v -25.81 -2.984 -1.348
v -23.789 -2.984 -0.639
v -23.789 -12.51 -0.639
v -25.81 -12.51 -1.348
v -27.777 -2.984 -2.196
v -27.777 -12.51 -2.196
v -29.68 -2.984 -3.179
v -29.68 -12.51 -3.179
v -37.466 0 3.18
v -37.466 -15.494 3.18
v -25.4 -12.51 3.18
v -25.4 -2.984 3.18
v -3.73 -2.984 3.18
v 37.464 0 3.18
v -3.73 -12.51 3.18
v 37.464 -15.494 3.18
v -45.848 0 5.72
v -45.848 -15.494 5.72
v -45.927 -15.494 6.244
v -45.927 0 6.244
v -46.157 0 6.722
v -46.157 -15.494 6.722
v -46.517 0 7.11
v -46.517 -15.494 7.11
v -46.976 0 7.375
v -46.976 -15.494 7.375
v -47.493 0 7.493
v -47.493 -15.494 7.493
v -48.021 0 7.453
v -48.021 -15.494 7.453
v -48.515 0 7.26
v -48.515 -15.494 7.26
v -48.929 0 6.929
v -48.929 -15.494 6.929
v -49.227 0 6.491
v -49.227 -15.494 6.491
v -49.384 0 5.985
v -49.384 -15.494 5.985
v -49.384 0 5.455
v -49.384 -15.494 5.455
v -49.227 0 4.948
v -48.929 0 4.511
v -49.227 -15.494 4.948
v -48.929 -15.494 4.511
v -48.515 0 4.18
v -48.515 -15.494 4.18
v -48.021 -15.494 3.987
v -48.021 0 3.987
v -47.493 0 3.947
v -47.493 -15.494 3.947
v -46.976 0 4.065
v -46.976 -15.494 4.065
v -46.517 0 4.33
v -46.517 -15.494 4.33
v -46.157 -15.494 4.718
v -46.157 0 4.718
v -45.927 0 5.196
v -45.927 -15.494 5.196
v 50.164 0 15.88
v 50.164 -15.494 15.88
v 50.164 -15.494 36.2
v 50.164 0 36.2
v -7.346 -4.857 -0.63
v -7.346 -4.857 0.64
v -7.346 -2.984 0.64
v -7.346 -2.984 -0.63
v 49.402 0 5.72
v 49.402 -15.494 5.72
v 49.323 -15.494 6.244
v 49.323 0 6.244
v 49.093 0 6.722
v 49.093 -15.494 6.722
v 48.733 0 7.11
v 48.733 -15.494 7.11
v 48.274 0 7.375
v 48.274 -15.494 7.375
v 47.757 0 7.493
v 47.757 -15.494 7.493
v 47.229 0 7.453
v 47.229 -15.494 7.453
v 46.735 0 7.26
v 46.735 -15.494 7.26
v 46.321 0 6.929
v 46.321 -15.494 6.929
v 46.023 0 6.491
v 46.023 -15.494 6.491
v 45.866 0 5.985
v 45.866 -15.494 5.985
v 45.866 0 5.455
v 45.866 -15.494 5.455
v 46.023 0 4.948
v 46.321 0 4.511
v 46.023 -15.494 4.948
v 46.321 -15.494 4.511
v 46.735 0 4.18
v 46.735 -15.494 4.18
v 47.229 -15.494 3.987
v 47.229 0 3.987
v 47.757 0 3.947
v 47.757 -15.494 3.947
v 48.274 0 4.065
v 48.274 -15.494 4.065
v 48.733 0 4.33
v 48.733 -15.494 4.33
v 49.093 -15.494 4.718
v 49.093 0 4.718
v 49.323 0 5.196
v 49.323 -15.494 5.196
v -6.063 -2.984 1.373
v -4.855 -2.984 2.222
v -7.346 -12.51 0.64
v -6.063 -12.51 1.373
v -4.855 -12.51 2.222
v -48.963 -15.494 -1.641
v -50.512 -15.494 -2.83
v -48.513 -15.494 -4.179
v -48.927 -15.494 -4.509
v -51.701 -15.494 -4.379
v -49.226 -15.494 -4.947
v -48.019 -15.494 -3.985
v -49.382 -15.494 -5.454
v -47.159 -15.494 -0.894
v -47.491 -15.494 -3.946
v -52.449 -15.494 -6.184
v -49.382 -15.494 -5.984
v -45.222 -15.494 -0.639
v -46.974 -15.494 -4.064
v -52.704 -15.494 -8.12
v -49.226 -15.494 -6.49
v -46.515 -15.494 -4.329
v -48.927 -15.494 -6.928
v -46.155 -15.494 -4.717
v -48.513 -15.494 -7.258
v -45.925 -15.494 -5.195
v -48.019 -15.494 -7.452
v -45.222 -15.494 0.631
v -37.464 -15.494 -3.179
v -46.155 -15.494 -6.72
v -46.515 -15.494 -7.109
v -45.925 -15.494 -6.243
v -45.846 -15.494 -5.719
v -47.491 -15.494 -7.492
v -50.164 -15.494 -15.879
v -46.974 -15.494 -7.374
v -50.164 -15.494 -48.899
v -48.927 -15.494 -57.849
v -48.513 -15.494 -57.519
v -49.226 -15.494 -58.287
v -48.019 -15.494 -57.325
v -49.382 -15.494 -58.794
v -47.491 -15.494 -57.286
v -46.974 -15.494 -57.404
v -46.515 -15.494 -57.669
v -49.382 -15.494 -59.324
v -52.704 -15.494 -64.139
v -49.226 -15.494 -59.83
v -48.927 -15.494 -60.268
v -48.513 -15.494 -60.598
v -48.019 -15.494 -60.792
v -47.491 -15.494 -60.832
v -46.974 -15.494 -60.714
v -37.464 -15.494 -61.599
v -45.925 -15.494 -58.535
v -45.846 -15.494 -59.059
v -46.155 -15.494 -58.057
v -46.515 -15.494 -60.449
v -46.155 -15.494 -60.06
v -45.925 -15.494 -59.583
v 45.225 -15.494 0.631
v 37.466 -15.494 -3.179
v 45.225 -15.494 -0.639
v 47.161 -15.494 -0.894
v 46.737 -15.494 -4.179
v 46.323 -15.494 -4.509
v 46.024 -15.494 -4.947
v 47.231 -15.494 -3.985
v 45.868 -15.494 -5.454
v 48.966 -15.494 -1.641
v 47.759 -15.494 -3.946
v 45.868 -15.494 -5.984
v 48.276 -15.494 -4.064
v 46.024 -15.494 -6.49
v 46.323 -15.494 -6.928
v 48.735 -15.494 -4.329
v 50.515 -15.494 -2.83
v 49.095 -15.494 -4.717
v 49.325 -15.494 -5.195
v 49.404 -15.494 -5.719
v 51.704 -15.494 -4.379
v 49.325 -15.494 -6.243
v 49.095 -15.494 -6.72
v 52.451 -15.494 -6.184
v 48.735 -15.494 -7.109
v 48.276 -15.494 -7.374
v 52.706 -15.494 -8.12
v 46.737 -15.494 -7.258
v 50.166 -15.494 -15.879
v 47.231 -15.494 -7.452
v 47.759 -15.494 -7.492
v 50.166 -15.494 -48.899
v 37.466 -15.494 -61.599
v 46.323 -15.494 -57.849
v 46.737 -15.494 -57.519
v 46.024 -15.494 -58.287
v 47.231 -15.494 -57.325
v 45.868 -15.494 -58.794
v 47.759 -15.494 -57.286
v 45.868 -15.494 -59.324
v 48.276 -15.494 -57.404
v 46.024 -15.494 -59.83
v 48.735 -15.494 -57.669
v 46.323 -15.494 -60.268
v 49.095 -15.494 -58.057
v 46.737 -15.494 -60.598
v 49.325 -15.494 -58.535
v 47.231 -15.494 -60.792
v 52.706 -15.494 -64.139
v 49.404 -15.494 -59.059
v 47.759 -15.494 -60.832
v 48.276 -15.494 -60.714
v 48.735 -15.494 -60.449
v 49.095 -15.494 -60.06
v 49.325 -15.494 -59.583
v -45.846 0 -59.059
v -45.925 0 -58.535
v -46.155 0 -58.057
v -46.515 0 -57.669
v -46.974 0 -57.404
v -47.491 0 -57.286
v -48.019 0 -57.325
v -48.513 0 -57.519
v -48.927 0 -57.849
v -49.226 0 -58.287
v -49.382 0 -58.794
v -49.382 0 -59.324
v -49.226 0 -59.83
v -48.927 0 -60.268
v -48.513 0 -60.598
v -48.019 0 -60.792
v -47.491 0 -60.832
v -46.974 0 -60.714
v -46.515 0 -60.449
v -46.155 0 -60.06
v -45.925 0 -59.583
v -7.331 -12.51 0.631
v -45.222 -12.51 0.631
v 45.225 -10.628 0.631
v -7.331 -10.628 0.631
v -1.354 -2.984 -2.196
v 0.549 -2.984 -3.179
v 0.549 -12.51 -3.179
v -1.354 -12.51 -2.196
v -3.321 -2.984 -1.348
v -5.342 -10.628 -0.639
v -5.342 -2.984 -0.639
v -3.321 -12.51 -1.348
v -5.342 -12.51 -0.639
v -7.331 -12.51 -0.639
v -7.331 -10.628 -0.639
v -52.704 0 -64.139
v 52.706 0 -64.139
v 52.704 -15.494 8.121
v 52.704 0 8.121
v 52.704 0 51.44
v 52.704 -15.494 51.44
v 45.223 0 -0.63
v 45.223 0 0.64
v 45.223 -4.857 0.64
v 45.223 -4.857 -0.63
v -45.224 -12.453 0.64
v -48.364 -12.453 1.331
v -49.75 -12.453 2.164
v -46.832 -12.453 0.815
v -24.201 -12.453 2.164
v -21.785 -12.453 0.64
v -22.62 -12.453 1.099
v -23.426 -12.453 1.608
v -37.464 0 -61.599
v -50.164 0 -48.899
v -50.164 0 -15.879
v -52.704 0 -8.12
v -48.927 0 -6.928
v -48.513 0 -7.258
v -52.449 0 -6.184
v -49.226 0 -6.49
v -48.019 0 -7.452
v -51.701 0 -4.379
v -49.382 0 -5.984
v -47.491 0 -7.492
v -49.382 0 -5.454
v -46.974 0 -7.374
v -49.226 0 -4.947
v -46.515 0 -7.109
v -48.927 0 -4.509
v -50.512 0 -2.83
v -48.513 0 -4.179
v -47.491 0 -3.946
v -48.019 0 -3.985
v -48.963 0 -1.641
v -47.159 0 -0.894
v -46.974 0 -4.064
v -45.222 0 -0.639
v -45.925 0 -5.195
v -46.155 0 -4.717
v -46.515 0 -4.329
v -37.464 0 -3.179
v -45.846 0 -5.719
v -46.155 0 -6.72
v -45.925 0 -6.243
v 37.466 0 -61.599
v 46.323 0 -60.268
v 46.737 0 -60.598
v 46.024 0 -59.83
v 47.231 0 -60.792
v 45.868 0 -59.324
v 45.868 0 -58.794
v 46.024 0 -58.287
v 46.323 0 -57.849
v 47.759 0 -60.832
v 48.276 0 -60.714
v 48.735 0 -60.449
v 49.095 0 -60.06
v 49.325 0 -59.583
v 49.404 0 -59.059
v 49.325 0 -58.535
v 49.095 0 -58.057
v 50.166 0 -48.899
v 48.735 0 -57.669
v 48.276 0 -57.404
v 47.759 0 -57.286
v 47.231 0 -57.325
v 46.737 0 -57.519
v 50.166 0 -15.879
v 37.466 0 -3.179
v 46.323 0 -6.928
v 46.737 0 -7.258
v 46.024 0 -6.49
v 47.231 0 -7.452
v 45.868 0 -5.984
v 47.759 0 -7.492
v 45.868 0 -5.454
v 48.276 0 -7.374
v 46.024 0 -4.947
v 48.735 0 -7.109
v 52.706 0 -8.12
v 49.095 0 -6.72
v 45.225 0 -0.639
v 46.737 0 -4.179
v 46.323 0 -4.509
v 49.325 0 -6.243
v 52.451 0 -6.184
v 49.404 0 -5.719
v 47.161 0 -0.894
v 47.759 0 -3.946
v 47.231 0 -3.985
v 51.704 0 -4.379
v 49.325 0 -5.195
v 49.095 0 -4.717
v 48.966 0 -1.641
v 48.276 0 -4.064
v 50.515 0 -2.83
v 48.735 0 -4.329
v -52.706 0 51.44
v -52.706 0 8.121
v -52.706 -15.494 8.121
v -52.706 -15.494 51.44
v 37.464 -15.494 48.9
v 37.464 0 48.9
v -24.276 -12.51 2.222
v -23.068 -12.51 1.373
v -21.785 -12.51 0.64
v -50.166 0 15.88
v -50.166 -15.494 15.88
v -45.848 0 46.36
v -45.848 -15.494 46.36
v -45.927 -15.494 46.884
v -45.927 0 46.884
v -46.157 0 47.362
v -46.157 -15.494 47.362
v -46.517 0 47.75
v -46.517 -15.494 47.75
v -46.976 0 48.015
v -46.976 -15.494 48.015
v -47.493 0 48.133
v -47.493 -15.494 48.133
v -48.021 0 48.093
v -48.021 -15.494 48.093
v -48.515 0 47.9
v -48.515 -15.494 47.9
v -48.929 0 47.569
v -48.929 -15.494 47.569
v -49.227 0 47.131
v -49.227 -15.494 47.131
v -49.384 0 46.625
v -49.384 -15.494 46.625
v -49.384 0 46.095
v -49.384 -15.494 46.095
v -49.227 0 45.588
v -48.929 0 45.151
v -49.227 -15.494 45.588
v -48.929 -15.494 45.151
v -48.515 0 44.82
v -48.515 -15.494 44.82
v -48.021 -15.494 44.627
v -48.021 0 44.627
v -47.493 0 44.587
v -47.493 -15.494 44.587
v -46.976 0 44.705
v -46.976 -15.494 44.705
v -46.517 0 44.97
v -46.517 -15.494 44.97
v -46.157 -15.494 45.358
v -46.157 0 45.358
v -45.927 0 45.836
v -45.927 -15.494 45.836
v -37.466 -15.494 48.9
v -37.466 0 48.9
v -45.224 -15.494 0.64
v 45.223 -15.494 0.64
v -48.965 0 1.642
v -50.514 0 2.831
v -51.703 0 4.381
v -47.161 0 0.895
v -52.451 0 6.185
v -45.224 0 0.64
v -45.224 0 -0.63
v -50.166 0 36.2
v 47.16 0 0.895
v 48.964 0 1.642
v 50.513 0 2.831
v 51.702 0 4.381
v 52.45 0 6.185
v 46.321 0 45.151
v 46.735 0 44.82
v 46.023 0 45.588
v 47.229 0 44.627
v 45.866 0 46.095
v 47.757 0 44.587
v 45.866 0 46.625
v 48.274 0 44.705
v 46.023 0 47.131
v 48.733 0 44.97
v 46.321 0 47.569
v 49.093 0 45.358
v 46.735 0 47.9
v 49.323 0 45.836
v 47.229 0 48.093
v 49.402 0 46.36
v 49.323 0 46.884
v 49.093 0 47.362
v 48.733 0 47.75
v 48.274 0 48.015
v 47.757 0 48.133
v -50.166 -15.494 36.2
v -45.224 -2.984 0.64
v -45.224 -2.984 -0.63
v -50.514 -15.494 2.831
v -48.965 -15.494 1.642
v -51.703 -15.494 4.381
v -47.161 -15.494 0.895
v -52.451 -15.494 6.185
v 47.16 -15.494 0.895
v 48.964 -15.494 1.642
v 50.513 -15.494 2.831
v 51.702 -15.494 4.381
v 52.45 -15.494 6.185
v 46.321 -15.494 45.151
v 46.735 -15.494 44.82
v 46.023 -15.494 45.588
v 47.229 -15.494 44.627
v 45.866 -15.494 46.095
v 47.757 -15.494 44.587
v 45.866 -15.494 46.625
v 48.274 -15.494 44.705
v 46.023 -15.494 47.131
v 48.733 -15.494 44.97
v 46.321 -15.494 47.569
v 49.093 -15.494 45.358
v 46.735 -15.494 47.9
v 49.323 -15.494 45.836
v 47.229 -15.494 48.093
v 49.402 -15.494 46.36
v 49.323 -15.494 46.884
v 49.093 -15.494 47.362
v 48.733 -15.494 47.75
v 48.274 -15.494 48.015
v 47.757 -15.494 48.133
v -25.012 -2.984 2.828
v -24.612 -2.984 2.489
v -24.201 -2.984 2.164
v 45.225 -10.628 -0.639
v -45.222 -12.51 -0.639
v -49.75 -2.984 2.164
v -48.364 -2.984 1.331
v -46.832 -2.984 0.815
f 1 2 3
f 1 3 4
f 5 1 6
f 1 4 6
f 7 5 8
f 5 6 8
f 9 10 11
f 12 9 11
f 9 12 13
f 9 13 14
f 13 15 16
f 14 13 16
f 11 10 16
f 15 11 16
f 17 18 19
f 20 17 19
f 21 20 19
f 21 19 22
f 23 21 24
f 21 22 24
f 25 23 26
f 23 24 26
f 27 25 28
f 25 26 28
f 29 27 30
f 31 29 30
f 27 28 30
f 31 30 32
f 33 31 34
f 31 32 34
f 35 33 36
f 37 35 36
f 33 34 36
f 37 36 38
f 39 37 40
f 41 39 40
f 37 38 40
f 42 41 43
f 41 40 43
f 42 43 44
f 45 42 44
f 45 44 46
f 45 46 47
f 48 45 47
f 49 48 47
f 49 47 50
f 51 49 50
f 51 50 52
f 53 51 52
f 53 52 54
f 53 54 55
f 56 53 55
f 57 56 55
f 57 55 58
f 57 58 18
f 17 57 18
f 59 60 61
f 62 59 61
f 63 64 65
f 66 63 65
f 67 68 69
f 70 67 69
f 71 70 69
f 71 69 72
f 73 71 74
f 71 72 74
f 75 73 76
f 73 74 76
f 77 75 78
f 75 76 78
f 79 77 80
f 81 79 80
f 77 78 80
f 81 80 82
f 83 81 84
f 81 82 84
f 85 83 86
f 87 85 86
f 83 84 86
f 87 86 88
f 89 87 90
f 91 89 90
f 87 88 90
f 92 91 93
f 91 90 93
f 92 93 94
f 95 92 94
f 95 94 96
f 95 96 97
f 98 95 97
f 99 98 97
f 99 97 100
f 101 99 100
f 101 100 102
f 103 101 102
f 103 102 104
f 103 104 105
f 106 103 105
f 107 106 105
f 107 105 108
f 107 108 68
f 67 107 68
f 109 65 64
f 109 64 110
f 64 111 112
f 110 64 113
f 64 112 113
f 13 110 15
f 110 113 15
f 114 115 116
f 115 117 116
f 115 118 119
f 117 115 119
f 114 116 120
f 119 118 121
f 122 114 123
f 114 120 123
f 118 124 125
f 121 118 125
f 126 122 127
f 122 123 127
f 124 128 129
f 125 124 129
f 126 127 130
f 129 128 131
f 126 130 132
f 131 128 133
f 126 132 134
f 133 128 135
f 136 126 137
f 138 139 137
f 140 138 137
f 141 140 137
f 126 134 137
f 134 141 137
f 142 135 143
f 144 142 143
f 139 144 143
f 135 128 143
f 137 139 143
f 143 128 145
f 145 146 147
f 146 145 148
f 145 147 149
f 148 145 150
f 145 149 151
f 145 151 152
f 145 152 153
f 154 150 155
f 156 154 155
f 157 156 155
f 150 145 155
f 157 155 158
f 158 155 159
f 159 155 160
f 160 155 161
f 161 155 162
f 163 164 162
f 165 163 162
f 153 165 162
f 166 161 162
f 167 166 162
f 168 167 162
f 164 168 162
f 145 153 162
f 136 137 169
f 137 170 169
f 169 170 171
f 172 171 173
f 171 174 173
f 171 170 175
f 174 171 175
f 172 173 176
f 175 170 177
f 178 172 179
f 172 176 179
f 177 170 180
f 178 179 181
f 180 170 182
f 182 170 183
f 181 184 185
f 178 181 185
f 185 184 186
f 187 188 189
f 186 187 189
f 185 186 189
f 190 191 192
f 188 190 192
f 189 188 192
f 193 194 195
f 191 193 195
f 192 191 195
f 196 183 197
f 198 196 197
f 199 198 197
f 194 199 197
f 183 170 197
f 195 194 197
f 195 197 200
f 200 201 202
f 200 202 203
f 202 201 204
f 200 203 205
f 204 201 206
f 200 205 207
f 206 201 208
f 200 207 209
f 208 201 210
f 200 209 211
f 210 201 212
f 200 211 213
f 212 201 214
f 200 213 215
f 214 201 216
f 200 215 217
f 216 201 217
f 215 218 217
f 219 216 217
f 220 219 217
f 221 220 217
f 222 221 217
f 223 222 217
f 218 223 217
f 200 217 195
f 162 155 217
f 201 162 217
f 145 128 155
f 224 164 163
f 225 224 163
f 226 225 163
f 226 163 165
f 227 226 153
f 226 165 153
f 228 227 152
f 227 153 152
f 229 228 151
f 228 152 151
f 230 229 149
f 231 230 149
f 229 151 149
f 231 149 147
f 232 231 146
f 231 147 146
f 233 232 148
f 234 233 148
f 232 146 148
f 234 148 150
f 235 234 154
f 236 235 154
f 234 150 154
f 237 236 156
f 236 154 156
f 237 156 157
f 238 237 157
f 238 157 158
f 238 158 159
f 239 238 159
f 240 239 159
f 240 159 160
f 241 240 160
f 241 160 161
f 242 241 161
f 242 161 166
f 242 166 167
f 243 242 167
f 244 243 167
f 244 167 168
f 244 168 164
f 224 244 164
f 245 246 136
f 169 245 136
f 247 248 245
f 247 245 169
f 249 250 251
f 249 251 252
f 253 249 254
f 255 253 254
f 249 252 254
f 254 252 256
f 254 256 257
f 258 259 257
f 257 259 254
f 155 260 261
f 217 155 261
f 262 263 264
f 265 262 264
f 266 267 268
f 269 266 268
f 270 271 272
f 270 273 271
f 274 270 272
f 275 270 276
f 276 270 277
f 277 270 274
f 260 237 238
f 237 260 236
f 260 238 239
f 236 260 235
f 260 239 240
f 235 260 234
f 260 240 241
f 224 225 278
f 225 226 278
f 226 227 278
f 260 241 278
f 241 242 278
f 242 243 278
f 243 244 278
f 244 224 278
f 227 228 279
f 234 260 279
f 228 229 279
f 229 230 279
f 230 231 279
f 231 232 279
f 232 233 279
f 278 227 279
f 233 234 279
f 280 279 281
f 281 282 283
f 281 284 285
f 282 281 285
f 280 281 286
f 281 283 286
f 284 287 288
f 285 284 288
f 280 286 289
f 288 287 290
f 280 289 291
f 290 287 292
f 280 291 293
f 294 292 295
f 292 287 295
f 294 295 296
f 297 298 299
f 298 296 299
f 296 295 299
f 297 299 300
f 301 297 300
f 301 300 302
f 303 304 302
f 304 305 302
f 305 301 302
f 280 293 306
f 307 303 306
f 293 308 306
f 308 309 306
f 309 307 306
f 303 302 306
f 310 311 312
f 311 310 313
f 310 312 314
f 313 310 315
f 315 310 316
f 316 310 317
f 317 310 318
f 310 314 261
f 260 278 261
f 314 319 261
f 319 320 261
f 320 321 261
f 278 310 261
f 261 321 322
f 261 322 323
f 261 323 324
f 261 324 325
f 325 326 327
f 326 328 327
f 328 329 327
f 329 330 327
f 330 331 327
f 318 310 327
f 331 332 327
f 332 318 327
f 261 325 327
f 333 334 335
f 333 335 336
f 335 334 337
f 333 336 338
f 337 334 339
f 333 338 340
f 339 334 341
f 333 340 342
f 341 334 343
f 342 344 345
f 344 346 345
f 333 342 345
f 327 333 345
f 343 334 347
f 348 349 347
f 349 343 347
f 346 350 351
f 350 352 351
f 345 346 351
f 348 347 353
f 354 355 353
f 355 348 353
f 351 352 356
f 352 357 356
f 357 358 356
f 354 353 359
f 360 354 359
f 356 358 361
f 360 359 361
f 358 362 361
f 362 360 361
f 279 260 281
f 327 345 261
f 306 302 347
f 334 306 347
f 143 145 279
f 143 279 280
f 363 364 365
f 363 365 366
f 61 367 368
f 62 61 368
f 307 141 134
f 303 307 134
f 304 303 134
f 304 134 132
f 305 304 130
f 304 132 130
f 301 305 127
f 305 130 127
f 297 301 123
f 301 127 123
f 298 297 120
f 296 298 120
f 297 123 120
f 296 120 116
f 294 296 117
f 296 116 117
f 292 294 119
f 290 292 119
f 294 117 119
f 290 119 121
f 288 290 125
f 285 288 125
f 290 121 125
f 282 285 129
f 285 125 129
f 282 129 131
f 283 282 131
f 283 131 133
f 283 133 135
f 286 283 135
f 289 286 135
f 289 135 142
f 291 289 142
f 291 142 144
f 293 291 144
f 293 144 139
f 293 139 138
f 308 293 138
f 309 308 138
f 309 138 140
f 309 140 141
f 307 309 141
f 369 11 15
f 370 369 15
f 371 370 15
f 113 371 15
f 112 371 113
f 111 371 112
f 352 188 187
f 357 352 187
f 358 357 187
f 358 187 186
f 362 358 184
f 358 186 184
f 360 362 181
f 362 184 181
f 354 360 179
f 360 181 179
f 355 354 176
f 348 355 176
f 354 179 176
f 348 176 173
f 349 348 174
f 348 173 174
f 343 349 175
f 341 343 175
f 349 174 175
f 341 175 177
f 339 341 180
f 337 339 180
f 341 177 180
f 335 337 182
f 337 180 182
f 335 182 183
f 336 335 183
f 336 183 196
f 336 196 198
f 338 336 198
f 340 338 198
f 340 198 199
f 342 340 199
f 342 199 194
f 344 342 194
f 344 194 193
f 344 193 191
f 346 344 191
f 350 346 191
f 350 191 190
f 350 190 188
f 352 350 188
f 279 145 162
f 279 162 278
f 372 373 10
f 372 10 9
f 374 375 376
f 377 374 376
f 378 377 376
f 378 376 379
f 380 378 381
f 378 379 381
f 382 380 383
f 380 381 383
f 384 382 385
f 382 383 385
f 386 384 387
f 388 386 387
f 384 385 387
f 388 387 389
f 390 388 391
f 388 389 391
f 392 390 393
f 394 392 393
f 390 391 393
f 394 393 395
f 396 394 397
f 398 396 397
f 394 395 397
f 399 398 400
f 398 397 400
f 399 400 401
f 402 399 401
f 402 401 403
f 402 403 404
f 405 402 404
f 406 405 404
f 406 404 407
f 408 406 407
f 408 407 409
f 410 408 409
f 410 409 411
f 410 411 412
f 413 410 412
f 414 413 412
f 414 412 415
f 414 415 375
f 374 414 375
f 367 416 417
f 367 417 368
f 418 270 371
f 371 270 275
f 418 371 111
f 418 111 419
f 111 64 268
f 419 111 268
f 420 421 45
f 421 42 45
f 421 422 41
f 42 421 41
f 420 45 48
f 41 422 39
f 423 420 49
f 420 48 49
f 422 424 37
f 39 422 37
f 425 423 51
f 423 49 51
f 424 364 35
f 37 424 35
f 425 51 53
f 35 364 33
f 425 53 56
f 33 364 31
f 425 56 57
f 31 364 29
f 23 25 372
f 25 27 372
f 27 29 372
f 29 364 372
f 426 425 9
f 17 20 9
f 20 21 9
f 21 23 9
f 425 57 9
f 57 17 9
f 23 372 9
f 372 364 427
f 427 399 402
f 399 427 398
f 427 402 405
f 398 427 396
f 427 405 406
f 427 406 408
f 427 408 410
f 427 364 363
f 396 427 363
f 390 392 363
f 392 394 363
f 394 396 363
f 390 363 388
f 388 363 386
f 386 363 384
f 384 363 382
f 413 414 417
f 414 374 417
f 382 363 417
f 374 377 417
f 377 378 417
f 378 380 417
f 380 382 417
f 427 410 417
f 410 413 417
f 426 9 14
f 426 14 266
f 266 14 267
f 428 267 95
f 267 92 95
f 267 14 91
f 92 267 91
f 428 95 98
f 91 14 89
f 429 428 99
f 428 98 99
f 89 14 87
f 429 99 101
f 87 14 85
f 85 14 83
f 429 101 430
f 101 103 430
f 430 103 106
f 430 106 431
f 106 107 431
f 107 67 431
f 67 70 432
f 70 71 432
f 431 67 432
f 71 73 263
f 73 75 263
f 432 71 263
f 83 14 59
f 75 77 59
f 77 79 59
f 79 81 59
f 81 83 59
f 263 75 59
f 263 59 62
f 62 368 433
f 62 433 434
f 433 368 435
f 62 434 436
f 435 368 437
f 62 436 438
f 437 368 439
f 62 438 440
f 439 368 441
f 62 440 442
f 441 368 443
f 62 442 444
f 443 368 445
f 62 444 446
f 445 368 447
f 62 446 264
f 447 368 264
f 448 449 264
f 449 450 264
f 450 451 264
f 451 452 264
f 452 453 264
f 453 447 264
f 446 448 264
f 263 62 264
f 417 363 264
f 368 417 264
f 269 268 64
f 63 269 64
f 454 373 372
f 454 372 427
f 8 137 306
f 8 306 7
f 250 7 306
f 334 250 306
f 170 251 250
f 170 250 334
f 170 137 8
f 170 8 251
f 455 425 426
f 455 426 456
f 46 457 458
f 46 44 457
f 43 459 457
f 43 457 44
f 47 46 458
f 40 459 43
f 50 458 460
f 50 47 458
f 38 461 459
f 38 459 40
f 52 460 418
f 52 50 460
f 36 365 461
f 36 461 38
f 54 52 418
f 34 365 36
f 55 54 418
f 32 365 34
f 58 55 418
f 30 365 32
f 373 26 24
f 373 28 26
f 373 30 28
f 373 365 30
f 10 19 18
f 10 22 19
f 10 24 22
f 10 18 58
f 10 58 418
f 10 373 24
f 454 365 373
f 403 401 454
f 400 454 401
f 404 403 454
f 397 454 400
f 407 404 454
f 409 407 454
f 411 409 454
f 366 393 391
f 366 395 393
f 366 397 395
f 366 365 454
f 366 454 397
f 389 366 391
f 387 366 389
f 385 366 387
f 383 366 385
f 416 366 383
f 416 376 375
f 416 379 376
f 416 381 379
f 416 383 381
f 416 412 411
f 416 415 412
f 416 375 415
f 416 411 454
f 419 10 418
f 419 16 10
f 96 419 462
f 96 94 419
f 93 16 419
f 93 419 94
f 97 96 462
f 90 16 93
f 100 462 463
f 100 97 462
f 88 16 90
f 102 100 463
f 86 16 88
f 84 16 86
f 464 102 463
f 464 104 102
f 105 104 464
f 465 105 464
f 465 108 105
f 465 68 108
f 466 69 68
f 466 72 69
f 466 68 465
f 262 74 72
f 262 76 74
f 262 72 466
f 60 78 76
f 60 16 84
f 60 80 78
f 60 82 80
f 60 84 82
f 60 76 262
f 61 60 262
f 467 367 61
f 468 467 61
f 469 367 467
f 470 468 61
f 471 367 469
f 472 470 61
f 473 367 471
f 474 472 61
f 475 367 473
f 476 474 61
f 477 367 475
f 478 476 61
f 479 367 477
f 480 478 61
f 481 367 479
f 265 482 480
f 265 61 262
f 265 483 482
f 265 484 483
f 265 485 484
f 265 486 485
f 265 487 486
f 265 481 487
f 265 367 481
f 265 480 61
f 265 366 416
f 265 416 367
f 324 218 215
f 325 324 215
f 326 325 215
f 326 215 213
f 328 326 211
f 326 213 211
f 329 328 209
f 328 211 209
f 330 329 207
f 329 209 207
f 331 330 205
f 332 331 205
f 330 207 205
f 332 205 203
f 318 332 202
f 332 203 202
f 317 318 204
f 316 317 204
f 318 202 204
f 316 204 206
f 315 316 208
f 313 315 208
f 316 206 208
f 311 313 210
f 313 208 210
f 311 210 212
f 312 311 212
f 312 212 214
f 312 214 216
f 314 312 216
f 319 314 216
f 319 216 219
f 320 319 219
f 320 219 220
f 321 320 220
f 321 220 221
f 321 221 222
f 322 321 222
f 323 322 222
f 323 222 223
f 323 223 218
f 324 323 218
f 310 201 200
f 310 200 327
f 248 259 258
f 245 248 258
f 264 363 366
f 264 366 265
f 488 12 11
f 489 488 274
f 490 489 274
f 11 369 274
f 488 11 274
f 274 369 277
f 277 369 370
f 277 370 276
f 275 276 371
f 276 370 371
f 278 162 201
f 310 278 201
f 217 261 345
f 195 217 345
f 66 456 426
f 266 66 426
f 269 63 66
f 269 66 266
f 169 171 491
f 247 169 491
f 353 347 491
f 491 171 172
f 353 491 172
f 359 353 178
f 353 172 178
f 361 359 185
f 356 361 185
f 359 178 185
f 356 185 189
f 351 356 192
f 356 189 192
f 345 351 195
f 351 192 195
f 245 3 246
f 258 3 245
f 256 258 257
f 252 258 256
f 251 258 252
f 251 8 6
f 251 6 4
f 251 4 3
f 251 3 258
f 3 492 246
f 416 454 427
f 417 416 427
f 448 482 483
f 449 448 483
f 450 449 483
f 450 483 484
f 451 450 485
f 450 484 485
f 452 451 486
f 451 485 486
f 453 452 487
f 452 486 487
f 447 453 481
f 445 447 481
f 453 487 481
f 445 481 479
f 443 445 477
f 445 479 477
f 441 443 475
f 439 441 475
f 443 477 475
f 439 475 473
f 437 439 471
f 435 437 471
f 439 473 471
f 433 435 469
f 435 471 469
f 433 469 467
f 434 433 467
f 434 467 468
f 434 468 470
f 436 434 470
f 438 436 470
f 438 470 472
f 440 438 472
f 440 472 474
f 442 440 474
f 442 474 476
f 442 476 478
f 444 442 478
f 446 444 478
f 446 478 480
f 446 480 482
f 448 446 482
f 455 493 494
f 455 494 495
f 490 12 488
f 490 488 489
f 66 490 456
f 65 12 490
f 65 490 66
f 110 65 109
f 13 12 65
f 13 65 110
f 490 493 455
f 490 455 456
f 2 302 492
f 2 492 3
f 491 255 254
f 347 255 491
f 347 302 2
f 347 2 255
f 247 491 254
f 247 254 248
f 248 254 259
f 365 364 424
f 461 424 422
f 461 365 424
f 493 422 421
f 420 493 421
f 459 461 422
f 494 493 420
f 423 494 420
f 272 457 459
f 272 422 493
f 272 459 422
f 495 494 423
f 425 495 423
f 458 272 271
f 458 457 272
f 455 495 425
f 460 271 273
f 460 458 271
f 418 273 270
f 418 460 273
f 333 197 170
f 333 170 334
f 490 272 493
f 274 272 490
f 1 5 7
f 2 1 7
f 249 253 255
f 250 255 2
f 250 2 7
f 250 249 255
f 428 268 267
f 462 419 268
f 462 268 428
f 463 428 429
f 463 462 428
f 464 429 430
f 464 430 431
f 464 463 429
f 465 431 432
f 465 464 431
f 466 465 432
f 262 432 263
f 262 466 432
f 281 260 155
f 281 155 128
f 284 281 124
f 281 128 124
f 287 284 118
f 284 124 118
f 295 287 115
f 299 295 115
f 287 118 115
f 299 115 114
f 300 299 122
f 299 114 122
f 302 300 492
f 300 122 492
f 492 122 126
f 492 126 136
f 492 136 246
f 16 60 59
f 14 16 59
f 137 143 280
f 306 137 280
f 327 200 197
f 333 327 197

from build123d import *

# Parameters (mm, degrees)
F0_W      = 105.41
F0_H      = 50.8
F2_DEPTH  = 15.494
F1_W      = 105.41
F1_H      = 63.5
F3_DEPTH  = 15.494
F4_W      = 100.33
F4_H      = 45.72
F6_DEPTH  = 25.4
F5_W      = 100.33
F5_H      = 58.42
F7_DEPTH  = 25.4
F8_SIZE   = 12.7
F9_SIZE   = 12.7
F10_R     = 1.778
F12_DEPTH = 25.4
F11_R     = 1.778
F13_DEPTH = 25.4
F16_DEPTH = 4.7625
F17_R     = 7.4811649871
F17_2_R   = 7.4811649871
F18_W     = 37.8915182585
F18_H     = 2.9845
F19_DEPTH = 1.27
F20_W     = 37.8787715588
F20_H     = 2.9845
F21_DEPTH = 1.27
F22_W     = 33.4627879753
F22_H     = 9.4689852803
F23_DEPTH = 1.524


with BuildPart() as f2:
    # F0 (on Front) → F2 (new body)
    with BuildSketch(Plane.XZ):
        with Locations((-0.0005561543, 26.0399340928)):
            Rectangle(F0_W, F0_H)
    extrude(amount=F2_DEPTH)

    # F4 (on face) → F6 (cut)
    with BuildSketch(Plane.XZ.offset(15.494)):
        with Locations((-0.0005561543, 26.0399340928)):
            Rectangle(F4_W, F4_H)
    extrude(amount=-F6_DEPTH, mode=Mode.SUBTRACT)

    # F8
    f8_edges = [f2.edges().sort_by_distance(p)[0] for p in [
        (-50.165556, -7.747, 48.899934),
        (-50.165556, -7.747, 3.179934),
        (50.164444, -7.747, 48.899934),
        (50.164444, -7.747, 3.179934),
    ]]
    chamfer(f8_edges, length=F8_SIZE)

    # F10 (on face) → F12 (cut)
    with BuildSketch(Plane.XZ.offset(15.494)):
        with Locations((-47.6255561543, 46.3599340928)):
            Circle(F10_R)
        with Locations((47.6244438457, 46.3599340928)):
            Circle(F10_R)
        with Locations((47.6244438457, 5.7199340928)):
            Circle(F10_R)
        with Locations((-47.6255561543, 5.7199340928)):
            Circle(F10_R)
    extrude(amount=-F12_DEPTH, mode=Mode.SUBTRACT)


with BuildPart() as f3:
    # F1 (on Front) → F3 (new body)
    with BuildSketch(Plane.XZ):
        with Locations((0.0013719928, -32.3886321804)):
            Rectangle(F1_W, F1_H)
    extrude(amount=F3_DEPTH)

    # F5 (on face) → F7 (cut)
    with BuildSketch(Plane.XZ.offset(15.494)):
        with Locations((0.0013719928, -32.3886321804)):
            Rectangle(F5_W, F5_H)
    extrude(amount=-F7_DEPTH, mode=Mode.SUBTRACT)

    # F9
    f9_edges = [f3.edges().sort_by_distance(p)[0] for p in [
        (-50.163628, -7.747, -3.178632),
        (50.166372, -7.747, -3.178632),
        (-50.163628, -7.747, -61.598632),
        (50.166372, -7.747, -61.598632),
    ]]
    chamfer(f9_edges, length=F9_SIZE)

    # F11 (on face) → F13 (cut)
    with BuildSketch(Plane.XZ.offset(15.494)):
        with Locations((-47.6236280072, -5.7186321804)):
            Circle(F11_R)
        with Locations((47.6263719928, -5.7186321804)):
            Circle(F11_R)
        with Locations((47.6263719928, -59.0586321804)):
            Circle(F11_R)
        with Locations((-47.6236280072, -59.0586321804)):
            Circle(F11_R)
    extrude(amount=-F13_DEPTH, mode=Mode.SUBTRACT)


with BuildPart() as f16_tool:
    # F15 (on offset) → F16 (new body, symmetric)
    with BuildSketch(Plane.XZ.offset(7.747)):
        with BuildLine():
            ThreePointArc((-20.7305265373, 0.1485658363), (-34.1169625247, -54.0672234968), (16.3385446548, -30.1341861486))
            ThreePointArc((16.3385446548, -30.1341861486), (9.3676365689, -10.5826244032), (-8.4002750212, 0.1485658363))
            ThreePointArc((-8.4002750212, 0.1485658363), (-14.5654007792, -1.0989419614), (-20.7305265373, 0.1485658363))
        make_face()
        with BuildLine():
            ThreePointArc((-20.7305265373, 0.1485658363), (-14.5654007792, -1.0989419614), (-8.4002750212, 0.1485658363))
            ThreePointArc((-8.4002750212, 0.1485658363), (-14.5654007792, 0.7697592854), (-20.7305265373, 0.1485658363))
        make_face()
        with BuildLine():
            ThreePointArc((-20.7305265373, 0.1485658363), (-14.5654007792, 0.7697592854), (-8.4002750212, 0.1485658363))
            ThreePointArc((-8.4002750212, 0.1485658363), (-1.3512232992, 5.9922725627), (1.2922360991, 14.758694917))
            ThreePointArc((1.2922360991, 14.758694917), (-23.3318231335, 27.972872397), (-20.7305265373, 0.1485658363))
        make_face()
    extrude(amount=F16_DEPTH, both=True)


with BuildPart() as f2_1:
    add(f2.part)

    # F16: cut by f16_tool
    add(f16_tool.part, mode=Mode.SUBTRACT)

    # F17
    f17_edges = [f2_1.edges().sort_by_distance(p)[0] for p in [
        (52.704444, -7.747, 0.639934),
        (-52.705556, -7.747, 0.639934),
    ]]
    fillet(f17_edges, radius=F17_R)

    # F20 (on face) → F21 (join)
    with BuildSketch(Plane(origin=(0, 0, 0.6399340928), x_dir=(1, 0, 0), z_dir=(0, 0, -1))):
        Polygon((-7.3456196084, 0), (45.2232788587, 0), (45.2232788587, 4.857190419), (-7.3456196084, 4.857190419), (-7.3456196084, 2.9845), align=None)
        with Locations((-26.2850053878, 1.49225)):
            Rectangle(F20_W, F20_H)
    extrude(amount=F21_DEPTH)

    # F22 (on face) → F23 (cut)
    with BuildSketch(Plane(origin=(0, 0, 0.6399340928), x_dir=(1, 0, 0), z_dir=(0, 0, -1))):
        with Locations((-38.5165759378, 7.7189926401)):
            Rectangle(F22_W, F22_H)
    extrude(amount=-F23_DEPTH, mode=Mode.SUBTRACT)


with BuildPart() as f3_1:
    add(f3.part)

    # F16: cut by f16_tool
    add(f16_tool.part, mode=Mode.SUBTRACT)

    # F17#2
    f17_2_edges = [f3_1.edges().sort_by_distance(p)[0] for p in [
        (52.706372, -7.747, -0.638632),
        (-52.703628, -7.747, -0.638632),
    ]]
    fillet(f17_2_edges, radius=F17_2_R)

    # F18 (on face) → F19 (join)
    with BuildSketch(Plane.XY.offset(-0.6386321804)):
        Polygon((-7.3309447616, -15.494), (45.2252070057, -15.494), (45.2252070057, -10.6284385547), (-7.3309447616, -10.6284385547), (-7.3309447616, -12.5095), align=None)
        with Locations((-26.2767038909, -14.00175)):
            Rectangle(F18_W, F18_H)
    extrude(amount=F19_DEPTH)


solid = Compound([f2_1.part, f3_1.part])
